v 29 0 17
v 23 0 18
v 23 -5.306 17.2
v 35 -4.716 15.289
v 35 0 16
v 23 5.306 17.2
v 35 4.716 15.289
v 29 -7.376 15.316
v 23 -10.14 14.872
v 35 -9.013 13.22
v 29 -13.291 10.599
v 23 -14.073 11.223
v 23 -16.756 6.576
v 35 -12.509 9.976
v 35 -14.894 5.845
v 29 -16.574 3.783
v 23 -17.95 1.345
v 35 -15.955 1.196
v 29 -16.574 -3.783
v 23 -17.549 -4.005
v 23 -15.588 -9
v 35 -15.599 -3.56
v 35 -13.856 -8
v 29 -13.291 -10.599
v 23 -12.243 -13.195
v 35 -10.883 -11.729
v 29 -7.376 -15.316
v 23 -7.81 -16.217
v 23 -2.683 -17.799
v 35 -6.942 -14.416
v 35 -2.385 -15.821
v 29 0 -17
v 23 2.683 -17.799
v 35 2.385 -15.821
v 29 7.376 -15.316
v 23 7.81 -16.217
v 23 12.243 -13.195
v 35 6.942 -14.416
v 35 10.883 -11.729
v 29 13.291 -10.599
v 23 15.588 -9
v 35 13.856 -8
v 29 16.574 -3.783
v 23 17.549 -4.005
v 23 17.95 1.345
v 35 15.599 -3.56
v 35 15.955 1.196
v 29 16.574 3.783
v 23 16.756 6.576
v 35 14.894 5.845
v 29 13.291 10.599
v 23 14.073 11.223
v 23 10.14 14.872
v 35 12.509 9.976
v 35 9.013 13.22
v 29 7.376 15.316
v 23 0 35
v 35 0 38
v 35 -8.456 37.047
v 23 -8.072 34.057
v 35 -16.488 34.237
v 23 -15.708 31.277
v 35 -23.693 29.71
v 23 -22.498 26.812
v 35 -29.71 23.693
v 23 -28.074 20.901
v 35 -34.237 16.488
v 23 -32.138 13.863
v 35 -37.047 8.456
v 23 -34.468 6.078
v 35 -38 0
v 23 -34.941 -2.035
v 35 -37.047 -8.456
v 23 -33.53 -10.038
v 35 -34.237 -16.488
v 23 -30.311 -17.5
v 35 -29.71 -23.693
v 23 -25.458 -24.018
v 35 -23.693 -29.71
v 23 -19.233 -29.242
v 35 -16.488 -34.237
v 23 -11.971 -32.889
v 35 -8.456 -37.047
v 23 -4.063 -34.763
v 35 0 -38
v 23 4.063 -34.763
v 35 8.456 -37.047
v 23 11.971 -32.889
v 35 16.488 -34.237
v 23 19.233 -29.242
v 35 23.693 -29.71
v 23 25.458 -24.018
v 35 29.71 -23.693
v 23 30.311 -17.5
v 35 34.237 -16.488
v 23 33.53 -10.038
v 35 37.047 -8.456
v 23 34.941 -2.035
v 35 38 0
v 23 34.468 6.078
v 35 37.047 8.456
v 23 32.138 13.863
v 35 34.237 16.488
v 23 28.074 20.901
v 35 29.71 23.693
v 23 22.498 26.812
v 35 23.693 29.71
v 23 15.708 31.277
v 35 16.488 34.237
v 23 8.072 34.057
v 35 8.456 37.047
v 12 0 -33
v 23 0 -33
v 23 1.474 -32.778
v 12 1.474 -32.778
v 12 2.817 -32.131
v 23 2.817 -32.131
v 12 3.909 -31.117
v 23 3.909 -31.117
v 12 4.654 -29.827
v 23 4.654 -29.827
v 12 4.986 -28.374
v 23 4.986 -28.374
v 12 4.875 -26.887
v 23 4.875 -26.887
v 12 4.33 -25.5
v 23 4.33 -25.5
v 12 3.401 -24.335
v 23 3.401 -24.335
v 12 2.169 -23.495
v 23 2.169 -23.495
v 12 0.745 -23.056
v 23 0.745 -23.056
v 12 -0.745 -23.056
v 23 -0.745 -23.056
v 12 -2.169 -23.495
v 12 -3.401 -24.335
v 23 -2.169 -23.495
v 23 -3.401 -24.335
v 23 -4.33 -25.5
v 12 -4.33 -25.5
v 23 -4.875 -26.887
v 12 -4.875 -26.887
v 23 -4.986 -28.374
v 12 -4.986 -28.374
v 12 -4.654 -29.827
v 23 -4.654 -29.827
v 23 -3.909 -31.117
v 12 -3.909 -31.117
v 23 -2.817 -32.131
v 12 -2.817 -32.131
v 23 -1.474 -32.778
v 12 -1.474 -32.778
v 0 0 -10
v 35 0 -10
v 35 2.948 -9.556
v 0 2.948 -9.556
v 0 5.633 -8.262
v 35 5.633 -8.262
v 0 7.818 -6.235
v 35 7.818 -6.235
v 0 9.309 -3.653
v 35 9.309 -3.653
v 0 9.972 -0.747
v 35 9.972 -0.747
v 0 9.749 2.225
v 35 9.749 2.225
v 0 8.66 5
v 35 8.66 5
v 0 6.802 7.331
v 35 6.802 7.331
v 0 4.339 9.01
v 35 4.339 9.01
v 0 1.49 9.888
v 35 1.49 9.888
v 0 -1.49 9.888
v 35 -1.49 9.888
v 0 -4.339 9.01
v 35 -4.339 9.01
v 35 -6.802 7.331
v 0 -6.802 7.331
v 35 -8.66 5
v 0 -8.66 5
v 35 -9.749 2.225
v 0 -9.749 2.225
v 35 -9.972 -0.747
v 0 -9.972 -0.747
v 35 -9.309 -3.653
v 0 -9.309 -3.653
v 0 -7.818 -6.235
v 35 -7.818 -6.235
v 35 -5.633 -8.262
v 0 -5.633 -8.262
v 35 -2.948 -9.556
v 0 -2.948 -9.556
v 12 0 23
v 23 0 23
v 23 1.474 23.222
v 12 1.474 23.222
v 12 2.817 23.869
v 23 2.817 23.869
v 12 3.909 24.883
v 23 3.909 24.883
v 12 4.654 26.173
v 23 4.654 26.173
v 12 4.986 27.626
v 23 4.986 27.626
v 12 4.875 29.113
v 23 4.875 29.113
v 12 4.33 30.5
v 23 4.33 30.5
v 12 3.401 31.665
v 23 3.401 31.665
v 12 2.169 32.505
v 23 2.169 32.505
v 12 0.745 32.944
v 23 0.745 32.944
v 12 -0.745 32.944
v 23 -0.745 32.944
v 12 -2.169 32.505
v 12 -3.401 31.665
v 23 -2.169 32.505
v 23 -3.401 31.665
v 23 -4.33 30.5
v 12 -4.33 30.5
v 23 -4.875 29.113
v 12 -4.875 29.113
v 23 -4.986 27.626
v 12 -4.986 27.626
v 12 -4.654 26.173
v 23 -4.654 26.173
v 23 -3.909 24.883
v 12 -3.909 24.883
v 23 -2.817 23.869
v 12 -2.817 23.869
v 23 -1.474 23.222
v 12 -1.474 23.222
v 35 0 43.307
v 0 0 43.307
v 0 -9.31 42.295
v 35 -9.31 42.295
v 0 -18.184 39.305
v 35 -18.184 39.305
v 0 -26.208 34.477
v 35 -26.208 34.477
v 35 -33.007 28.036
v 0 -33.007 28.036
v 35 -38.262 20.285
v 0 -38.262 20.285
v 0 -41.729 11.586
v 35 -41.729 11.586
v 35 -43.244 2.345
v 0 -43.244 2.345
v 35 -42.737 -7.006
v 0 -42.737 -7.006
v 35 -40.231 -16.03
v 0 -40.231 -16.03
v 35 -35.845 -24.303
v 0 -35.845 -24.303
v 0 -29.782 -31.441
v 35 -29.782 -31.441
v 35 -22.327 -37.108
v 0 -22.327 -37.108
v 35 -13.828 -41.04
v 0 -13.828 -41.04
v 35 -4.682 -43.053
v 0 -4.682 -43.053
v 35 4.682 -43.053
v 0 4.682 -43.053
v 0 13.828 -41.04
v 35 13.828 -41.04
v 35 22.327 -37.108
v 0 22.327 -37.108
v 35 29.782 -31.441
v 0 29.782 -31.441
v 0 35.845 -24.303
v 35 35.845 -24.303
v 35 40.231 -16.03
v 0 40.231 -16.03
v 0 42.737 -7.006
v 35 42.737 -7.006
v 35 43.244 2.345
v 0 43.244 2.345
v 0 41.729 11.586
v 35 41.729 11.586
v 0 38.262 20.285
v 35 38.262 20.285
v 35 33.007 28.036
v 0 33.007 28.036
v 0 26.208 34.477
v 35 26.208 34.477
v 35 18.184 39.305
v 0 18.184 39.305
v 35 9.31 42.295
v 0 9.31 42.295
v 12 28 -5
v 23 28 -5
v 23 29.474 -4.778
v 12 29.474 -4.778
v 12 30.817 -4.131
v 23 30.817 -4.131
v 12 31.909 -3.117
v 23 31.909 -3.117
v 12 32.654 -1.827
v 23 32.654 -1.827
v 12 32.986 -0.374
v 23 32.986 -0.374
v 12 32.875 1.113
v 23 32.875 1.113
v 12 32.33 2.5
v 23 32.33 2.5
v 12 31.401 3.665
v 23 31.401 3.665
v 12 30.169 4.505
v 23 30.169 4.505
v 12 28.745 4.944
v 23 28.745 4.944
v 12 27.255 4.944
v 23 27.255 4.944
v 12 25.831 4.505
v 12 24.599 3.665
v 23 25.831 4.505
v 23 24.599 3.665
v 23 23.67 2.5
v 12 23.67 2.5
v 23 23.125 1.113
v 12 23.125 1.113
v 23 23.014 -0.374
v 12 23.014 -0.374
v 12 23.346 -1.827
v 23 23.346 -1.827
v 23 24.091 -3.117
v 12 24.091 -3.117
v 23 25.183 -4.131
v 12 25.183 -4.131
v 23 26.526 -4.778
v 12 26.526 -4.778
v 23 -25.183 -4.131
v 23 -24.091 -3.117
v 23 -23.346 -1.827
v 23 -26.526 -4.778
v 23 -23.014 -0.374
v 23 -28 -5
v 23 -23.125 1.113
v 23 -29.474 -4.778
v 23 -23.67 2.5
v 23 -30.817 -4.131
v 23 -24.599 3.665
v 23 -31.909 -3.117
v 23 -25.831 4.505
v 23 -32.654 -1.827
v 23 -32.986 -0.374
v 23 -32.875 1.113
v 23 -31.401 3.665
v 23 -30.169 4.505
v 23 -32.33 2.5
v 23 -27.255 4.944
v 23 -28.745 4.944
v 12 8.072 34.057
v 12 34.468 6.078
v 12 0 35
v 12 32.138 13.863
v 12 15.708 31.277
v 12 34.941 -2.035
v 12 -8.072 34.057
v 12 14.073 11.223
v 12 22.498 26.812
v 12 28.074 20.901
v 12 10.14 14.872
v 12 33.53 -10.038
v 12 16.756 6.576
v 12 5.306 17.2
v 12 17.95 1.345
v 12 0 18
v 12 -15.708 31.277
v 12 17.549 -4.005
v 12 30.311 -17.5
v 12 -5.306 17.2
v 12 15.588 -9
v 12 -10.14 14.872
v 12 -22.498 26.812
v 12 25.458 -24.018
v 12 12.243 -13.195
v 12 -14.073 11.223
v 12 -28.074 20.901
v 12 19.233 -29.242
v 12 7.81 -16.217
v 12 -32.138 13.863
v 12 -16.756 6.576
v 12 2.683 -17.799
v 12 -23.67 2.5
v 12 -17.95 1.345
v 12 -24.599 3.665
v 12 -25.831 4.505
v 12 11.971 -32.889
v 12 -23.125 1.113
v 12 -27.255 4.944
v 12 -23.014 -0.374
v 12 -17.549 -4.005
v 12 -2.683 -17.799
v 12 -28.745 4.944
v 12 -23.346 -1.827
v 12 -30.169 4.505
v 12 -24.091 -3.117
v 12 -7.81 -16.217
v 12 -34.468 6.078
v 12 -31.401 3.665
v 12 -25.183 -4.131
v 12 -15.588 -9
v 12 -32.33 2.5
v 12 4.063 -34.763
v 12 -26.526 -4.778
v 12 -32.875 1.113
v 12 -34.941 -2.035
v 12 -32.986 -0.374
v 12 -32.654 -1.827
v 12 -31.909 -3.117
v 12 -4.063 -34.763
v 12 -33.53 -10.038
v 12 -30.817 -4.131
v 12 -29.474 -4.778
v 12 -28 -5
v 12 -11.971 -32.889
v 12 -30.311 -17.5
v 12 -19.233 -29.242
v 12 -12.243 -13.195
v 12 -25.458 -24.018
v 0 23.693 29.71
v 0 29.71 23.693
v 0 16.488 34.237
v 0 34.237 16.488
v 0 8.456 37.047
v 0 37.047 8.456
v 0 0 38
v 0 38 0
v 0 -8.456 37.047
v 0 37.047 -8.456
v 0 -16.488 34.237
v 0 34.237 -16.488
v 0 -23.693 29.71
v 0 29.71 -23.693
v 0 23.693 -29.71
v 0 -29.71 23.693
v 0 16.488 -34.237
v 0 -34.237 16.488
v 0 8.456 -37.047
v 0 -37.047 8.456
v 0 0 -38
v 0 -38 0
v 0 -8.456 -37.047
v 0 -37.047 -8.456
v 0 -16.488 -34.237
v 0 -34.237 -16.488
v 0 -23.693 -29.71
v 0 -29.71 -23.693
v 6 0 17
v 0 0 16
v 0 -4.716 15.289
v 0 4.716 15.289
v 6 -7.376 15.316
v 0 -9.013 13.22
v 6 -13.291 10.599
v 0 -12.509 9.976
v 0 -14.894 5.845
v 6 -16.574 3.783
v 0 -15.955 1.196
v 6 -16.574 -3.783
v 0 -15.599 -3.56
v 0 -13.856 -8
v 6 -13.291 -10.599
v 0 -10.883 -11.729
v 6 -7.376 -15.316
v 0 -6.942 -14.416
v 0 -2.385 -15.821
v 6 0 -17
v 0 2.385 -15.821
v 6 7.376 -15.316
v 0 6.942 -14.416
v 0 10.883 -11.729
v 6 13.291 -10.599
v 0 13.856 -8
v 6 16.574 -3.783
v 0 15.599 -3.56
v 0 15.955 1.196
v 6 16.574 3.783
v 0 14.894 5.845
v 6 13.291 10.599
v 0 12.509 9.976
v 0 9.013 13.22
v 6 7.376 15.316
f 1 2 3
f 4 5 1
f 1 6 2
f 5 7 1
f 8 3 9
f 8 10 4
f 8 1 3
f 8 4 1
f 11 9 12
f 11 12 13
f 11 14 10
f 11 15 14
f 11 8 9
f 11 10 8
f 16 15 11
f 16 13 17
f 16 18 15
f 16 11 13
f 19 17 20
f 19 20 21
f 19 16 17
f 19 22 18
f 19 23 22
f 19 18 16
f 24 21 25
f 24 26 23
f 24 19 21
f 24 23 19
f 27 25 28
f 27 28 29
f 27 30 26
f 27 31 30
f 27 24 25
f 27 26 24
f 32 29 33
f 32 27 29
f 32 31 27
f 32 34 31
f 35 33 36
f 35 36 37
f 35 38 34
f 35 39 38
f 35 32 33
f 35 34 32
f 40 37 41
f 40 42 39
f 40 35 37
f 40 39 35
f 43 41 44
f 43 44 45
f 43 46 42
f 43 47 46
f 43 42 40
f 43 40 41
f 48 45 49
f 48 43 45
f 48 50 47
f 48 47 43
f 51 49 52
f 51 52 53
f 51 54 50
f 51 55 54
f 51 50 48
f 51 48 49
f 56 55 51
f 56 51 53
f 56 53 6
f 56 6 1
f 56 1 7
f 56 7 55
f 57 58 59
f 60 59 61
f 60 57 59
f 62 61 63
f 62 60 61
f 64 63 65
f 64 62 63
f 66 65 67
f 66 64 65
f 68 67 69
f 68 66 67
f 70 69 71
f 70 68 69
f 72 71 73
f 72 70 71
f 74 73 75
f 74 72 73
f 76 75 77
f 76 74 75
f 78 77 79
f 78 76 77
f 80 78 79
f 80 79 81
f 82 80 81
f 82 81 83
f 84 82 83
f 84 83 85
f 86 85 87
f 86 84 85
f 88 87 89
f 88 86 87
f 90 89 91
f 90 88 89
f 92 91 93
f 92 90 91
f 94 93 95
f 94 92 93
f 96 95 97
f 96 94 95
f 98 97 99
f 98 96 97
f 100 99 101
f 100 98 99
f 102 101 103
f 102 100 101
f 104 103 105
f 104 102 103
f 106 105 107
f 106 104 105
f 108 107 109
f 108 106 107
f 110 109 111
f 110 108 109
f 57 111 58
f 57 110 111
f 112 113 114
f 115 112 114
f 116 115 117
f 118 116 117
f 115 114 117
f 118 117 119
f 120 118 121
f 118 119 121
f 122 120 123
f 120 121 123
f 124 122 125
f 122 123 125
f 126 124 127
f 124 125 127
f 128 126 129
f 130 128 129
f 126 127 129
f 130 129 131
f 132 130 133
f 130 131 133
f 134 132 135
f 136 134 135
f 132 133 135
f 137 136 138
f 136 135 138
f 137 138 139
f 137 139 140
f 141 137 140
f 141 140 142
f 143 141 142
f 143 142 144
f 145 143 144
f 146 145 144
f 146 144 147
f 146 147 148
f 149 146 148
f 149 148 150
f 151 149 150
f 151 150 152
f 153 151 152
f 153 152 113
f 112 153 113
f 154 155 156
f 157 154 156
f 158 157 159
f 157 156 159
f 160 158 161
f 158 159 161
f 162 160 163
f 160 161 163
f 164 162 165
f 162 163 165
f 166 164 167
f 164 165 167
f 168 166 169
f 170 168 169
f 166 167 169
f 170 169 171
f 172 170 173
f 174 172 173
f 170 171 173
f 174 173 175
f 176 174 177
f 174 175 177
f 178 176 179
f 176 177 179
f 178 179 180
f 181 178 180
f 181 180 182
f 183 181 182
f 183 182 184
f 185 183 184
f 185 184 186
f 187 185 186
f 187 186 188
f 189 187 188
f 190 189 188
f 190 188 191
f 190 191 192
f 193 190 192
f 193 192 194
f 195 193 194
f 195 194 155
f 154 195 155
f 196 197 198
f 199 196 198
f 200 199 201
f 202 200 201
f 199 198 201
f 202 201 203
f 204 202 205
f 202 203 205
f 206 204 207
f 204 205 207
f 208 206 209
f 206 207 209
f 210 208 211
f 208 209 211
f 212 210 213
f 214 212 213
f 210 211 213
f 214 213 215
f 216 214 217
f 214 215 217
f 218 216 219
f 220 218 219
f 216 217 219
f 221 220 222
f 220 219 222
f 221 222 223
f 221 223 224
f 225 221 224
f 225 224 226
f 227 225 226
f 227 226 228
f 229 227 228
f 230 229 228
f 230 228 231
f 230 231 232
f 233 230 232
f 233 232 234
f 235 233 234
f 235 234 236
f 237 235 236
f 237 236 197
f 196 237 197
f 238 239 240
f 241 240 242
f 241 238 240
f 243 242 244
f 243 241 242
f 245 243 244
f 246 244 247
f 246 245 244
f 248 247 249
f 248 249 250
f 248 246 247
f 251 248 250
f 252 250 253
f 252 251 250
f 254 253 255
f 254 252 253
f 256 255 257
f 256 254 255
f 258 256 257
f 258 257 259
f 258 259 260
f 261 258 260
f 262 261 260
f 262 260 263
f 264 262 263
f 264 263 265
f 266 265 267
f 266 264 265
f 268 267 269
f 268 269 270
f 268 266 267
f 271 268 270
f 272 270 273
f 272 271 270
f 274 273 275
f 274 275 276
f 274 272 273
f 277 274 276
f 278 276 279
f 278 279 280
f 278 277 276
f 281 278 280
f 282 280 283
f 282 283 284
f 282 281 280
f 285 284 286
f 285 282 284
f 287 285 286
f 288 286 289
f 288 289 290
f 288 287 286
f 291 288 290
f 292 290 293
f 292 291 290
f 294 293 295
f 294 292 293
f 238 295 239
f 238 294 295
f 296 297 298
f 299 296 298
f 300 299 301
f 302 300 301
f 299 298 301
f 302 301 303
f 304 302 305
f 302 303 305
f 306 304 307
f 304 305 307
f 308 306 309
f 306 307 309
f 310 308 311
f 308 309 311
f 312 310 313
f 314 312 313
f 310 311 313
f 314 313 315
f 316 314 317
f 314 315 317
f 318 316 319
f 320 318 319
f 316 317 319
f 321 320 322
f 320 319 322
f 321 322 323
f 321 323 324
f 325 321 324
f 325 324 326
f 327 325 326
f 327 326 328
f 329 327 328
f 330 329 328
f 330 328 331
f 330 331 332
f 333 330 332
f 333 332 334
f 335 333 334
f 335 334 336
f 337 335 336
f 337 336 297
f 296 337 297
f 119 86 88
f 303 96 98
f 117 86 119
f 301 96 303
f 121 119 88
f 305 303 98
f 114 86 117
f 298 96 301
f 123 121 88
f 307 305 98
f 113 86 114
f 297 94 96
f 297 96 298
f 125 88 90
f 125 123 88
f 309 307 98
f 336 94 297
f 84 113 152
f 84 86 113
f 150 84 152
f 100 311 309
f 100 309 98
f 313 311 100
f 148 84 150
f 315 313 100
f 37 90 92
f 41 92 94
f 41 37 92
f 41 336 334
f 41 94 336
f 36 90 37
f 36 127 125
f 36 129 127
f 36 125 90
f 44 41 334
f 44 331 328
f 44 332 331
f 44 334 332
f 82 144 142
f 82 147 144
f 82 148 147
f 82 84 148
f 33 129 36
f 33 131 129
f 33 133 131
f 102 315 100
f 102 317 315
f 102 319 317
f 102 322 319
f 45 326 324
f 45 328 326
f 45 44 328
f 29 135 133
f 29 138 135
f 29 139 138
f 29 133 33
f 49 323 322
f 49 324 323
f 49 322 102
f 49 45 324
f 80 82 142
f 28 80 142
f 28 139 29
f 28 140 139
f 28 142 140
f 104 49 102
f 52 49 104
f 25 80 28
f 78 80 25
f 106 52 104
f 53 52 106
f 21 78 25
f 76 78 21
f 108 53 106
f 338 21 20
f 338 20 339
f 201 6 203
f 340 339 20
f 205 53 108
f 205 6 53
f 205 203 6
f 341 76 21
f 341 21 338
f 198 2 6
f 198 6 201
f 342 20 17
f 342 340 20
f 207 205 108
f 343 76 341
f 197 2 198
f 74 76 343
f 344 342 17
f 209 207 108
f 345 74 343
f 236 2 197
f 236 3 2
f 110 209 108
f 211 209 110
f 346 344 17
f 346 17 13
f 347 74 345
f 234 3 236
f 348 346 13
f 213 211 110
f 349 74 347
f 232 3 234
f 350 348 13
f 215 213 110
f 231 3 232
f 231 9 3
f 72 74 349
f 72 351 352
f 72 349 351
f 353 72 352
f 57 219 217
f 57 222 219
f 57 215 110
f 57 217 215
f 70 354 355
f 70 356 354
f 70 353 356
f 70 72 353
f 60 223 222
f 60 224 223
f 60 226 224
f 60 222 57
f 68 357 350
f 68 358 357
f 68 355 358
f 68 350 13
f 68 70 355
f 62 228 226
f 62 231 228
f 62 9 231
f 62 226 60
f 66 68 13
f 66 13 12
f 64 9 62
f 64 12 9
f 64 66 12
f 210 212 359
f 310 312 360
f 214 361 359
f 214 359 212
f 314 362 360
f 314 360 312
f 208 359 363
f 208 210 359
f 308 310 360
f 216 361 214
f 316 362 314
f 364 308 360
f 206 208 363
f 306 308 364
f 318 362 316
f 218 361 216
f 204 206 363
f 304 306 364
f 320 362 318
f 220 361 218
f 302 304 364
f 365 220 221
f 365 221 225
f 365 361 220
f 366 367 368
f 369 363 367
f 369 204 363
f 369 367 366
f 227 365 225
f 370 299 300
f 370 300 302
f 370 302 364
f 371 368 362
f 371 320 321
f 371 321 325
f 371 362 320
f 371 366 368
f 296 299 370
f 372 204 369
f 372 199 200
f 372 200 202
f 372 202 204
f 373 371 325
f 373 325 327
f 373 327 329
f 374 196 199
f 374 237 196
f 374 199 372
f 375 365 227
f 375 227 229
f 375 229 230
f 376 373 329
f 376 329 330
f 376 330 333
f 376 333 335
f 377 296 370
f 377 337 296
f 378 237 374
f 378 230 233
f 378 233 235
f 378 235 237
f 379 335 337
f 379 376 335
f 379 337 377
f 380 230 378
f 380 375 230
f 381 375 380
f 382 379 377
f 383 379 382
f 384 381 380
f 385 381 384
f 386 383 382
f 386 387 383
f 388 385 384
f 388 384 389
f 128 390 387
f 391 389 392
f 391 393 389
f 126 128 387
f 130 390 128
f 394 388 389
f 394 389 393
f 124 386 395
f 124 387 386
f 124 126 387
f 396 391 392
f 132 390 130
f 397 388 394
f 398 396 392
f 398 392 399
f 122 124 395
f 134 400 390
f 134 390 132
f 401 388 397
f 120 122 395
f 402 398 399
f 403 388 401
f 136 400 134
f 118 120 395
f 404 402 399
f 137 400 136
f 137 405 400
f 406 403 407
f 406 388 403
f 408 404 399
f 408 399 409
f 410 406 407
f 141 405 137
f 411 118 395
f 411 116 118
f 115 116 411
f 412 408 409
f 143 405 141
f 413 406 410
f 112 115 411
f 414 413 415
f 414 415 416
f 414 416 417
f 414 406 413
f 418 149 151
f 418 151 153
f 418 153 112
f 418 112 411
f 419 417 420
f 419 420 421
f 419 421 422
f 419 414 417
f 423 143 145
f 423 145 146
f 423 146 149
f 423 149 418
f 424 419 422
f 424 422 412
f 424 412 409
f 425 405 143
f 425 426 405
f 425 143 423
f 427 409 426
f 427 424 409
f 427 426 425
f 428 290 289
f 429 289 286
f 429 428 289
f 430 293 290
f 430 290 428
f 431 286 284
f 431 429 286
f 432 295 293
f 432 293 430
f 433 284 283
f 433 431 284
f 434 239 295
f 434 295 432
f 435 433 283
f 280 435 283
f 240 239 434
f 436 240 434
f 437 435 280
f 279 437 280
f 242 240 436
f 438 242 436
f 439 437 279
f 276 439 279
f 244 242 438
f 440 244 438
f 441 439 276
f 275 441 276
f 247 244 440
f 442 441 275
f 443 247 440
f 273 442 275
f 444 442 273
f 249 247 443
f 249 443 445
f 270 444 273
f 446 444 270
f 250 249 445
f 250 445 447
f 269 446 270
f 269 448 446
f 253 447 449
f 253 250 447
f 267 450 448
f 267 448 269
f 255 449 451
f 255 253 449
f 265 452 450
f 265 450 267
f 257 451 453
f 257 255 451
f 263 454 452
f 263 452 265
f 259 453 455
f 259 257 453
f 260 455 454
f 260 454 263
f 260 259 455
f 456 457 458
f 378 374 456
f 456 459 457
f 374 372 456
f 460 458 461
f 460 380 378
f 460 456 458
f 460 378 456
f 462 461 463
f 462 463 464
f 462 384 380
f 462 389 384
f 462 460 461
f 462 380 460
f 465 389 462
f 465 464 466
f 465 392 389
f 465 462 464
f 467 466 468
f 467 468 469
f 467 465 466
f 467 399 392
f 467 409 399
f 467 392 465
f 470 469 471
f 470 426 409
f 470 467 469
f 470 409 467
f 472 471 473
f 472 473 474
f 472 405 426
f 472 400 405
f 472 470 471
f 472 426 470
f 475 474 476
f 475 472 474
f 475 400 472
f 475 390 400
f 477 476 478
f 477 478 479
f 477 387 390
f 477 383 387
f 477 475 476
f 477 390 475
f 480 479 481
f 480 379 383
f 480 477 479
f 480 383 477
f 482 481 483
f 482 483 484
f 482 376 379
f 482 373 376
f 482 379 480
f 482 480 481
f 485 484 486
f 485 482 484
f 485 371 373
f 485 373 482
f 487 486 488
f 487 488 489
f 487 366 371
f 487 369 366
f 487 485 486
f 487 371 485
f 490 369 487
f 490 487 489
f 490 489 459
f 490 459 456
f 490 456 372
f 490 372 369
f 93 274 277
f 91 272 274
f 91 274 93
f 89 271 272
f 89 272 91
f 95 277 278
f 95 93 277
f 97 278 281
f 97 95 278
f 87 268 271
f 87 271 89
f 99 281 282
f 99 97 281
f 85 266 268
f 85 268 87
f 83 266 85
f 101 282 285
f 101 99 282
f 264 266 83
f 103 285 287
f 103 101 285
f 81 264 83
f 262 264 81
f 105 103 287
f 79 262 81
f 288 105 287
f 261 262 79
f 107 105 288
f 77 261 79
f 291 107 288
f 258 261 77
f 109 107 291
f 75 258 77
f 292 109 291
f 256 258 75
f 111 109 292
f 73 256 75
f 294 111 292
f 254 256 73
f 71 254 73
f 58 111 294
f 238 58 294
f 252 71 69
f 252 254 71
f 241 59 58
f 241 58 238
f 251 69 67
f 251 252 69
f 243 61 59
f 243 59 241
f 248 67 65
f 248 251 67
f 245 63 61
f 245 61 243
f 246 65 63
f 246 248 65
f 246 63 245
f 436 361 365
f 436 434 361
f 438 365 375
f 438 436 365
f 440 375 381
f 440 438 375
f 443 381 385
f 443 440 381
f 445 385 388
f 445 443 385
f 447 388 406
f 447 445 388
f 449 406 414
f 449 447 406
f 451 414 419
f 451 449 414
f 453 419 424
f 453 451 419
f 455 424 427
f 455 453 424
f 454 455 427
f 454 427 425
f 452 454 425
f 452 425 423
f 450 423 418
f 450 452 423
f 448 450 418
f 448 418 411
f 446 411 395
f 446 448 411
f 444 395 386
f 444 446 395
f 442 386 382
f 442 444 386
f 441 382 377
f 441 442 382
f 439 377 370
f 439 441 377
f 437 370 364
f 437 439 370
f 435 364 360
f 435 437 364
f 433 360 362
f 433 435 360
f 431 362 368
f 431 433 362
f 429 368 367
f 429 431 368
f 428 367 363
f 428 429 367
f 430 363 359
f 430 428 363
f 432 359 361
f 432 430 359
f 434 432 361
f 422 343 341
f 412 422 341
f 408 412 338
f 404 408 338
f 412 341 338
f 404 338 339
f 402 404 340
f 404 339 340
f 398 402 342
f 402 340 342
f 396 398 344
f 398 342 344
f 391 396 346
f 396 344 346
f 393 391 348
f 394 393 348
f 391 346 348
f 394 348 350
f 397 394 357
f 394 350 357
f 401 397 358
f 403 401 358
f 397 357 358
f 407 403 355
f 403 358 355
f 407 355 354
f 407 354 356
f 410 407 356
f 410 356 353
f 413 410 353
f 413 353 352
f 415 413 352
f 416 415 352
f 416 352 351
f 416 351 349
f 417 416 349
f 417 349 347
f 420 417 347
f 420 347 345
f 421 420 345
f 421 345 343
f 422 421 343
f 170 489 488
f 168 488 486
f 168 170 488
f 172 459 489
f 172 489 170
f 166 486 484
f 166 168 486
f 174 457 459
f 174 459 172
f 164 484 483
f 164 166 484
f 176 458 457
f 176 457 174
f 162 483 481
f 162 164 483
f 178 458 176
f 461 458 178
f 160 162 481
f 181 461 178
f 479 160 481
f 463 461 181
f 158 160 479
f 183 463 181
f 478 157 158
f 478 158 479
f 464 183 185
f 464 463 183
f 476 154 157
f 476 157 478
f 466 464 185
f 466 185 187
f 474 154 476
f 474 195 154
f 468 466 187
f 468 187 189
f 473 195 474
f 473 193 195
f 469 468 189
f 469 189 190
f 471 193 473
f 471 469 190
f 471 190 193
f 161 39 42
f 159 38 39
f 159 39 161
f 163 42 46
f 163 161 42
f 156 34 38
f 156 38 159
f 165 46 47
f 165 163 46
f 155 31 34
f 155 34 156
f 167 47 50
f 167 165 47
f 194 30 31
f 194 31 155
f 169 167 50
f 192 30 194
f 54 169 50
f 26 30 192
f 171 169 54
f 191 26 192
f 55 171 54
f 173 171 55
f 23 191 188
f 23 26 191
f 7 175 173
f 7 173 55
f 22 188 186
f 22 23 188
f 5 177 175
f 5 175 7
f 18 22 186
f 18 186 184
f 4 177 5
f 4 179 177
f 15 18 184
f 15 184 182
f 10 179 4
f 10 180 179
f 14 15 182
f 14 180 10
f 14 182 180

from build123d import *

# Parameters (mm, degrees)
SKETCH2_R          = 5
CUT_EXTRUDE1_DEPTH = 66.421885576
SKETCH3_R          = 10
CUT_EXTRUDE2_DEPTH = 71.540932177


with BuildPart() as part:
    # Sketch1 → Revolve1 (revolve)
    with BuildSketch(Plane(origin=(0, 0, 0), x_dir=(1, 0, 0), z_dir=(0, 1, 0)), mode=Mode.PRIVATE) as revolve1_sk:
        Polygon((0, 0), (0, 16), (12, 18), (12, 35), (0, 38), (0, 43.307176728), (35, 43.307176728), (35, 38), (23, 35), (23, 18), (35, 16), (35, 0), align=None)
    revolve(revolve1_sk.sketch.rotate(Axis((0, 0, 0), (1, 0, 0)), 180), axis=Axis((0, 0, 0), (1, 0, 0)))

    # Sketch2 → Cut-Extrude1 (cut, through all)
    with BuildSketch(Plane(origin=(23, 0, 0), x_dir=(0, 0, -1), z_dir=(1, 0, 0))):
        with Locations((0, 28)):
            Circle(SKETCH2_R)
        with Locations((28, 0)):
            Circle(SKETCH2_R)
        with Locations((0, -28)):
            Circle(SKETCH2_R)
        with Locations((-28, 0)):
            Circle(SKETCH2_R)
    extrude(amount=-CUT_EXTRUDE1_DEPTH, mode=Mode.SUBTRACT)

    # Sketch3 → Cut-Extrude2 (cut, through all)
    with BuildSketch(Plane(origin=(35, 0, 0), x_dir=(0, 0, -1), z_dir=(1, 0, 0))):
        Circle(SKETCH3_R)
    extrude(amount=-CUT_EXTRUDE2_DEPTH, mode=Mode.SUBTRACT)


solid = part.part
